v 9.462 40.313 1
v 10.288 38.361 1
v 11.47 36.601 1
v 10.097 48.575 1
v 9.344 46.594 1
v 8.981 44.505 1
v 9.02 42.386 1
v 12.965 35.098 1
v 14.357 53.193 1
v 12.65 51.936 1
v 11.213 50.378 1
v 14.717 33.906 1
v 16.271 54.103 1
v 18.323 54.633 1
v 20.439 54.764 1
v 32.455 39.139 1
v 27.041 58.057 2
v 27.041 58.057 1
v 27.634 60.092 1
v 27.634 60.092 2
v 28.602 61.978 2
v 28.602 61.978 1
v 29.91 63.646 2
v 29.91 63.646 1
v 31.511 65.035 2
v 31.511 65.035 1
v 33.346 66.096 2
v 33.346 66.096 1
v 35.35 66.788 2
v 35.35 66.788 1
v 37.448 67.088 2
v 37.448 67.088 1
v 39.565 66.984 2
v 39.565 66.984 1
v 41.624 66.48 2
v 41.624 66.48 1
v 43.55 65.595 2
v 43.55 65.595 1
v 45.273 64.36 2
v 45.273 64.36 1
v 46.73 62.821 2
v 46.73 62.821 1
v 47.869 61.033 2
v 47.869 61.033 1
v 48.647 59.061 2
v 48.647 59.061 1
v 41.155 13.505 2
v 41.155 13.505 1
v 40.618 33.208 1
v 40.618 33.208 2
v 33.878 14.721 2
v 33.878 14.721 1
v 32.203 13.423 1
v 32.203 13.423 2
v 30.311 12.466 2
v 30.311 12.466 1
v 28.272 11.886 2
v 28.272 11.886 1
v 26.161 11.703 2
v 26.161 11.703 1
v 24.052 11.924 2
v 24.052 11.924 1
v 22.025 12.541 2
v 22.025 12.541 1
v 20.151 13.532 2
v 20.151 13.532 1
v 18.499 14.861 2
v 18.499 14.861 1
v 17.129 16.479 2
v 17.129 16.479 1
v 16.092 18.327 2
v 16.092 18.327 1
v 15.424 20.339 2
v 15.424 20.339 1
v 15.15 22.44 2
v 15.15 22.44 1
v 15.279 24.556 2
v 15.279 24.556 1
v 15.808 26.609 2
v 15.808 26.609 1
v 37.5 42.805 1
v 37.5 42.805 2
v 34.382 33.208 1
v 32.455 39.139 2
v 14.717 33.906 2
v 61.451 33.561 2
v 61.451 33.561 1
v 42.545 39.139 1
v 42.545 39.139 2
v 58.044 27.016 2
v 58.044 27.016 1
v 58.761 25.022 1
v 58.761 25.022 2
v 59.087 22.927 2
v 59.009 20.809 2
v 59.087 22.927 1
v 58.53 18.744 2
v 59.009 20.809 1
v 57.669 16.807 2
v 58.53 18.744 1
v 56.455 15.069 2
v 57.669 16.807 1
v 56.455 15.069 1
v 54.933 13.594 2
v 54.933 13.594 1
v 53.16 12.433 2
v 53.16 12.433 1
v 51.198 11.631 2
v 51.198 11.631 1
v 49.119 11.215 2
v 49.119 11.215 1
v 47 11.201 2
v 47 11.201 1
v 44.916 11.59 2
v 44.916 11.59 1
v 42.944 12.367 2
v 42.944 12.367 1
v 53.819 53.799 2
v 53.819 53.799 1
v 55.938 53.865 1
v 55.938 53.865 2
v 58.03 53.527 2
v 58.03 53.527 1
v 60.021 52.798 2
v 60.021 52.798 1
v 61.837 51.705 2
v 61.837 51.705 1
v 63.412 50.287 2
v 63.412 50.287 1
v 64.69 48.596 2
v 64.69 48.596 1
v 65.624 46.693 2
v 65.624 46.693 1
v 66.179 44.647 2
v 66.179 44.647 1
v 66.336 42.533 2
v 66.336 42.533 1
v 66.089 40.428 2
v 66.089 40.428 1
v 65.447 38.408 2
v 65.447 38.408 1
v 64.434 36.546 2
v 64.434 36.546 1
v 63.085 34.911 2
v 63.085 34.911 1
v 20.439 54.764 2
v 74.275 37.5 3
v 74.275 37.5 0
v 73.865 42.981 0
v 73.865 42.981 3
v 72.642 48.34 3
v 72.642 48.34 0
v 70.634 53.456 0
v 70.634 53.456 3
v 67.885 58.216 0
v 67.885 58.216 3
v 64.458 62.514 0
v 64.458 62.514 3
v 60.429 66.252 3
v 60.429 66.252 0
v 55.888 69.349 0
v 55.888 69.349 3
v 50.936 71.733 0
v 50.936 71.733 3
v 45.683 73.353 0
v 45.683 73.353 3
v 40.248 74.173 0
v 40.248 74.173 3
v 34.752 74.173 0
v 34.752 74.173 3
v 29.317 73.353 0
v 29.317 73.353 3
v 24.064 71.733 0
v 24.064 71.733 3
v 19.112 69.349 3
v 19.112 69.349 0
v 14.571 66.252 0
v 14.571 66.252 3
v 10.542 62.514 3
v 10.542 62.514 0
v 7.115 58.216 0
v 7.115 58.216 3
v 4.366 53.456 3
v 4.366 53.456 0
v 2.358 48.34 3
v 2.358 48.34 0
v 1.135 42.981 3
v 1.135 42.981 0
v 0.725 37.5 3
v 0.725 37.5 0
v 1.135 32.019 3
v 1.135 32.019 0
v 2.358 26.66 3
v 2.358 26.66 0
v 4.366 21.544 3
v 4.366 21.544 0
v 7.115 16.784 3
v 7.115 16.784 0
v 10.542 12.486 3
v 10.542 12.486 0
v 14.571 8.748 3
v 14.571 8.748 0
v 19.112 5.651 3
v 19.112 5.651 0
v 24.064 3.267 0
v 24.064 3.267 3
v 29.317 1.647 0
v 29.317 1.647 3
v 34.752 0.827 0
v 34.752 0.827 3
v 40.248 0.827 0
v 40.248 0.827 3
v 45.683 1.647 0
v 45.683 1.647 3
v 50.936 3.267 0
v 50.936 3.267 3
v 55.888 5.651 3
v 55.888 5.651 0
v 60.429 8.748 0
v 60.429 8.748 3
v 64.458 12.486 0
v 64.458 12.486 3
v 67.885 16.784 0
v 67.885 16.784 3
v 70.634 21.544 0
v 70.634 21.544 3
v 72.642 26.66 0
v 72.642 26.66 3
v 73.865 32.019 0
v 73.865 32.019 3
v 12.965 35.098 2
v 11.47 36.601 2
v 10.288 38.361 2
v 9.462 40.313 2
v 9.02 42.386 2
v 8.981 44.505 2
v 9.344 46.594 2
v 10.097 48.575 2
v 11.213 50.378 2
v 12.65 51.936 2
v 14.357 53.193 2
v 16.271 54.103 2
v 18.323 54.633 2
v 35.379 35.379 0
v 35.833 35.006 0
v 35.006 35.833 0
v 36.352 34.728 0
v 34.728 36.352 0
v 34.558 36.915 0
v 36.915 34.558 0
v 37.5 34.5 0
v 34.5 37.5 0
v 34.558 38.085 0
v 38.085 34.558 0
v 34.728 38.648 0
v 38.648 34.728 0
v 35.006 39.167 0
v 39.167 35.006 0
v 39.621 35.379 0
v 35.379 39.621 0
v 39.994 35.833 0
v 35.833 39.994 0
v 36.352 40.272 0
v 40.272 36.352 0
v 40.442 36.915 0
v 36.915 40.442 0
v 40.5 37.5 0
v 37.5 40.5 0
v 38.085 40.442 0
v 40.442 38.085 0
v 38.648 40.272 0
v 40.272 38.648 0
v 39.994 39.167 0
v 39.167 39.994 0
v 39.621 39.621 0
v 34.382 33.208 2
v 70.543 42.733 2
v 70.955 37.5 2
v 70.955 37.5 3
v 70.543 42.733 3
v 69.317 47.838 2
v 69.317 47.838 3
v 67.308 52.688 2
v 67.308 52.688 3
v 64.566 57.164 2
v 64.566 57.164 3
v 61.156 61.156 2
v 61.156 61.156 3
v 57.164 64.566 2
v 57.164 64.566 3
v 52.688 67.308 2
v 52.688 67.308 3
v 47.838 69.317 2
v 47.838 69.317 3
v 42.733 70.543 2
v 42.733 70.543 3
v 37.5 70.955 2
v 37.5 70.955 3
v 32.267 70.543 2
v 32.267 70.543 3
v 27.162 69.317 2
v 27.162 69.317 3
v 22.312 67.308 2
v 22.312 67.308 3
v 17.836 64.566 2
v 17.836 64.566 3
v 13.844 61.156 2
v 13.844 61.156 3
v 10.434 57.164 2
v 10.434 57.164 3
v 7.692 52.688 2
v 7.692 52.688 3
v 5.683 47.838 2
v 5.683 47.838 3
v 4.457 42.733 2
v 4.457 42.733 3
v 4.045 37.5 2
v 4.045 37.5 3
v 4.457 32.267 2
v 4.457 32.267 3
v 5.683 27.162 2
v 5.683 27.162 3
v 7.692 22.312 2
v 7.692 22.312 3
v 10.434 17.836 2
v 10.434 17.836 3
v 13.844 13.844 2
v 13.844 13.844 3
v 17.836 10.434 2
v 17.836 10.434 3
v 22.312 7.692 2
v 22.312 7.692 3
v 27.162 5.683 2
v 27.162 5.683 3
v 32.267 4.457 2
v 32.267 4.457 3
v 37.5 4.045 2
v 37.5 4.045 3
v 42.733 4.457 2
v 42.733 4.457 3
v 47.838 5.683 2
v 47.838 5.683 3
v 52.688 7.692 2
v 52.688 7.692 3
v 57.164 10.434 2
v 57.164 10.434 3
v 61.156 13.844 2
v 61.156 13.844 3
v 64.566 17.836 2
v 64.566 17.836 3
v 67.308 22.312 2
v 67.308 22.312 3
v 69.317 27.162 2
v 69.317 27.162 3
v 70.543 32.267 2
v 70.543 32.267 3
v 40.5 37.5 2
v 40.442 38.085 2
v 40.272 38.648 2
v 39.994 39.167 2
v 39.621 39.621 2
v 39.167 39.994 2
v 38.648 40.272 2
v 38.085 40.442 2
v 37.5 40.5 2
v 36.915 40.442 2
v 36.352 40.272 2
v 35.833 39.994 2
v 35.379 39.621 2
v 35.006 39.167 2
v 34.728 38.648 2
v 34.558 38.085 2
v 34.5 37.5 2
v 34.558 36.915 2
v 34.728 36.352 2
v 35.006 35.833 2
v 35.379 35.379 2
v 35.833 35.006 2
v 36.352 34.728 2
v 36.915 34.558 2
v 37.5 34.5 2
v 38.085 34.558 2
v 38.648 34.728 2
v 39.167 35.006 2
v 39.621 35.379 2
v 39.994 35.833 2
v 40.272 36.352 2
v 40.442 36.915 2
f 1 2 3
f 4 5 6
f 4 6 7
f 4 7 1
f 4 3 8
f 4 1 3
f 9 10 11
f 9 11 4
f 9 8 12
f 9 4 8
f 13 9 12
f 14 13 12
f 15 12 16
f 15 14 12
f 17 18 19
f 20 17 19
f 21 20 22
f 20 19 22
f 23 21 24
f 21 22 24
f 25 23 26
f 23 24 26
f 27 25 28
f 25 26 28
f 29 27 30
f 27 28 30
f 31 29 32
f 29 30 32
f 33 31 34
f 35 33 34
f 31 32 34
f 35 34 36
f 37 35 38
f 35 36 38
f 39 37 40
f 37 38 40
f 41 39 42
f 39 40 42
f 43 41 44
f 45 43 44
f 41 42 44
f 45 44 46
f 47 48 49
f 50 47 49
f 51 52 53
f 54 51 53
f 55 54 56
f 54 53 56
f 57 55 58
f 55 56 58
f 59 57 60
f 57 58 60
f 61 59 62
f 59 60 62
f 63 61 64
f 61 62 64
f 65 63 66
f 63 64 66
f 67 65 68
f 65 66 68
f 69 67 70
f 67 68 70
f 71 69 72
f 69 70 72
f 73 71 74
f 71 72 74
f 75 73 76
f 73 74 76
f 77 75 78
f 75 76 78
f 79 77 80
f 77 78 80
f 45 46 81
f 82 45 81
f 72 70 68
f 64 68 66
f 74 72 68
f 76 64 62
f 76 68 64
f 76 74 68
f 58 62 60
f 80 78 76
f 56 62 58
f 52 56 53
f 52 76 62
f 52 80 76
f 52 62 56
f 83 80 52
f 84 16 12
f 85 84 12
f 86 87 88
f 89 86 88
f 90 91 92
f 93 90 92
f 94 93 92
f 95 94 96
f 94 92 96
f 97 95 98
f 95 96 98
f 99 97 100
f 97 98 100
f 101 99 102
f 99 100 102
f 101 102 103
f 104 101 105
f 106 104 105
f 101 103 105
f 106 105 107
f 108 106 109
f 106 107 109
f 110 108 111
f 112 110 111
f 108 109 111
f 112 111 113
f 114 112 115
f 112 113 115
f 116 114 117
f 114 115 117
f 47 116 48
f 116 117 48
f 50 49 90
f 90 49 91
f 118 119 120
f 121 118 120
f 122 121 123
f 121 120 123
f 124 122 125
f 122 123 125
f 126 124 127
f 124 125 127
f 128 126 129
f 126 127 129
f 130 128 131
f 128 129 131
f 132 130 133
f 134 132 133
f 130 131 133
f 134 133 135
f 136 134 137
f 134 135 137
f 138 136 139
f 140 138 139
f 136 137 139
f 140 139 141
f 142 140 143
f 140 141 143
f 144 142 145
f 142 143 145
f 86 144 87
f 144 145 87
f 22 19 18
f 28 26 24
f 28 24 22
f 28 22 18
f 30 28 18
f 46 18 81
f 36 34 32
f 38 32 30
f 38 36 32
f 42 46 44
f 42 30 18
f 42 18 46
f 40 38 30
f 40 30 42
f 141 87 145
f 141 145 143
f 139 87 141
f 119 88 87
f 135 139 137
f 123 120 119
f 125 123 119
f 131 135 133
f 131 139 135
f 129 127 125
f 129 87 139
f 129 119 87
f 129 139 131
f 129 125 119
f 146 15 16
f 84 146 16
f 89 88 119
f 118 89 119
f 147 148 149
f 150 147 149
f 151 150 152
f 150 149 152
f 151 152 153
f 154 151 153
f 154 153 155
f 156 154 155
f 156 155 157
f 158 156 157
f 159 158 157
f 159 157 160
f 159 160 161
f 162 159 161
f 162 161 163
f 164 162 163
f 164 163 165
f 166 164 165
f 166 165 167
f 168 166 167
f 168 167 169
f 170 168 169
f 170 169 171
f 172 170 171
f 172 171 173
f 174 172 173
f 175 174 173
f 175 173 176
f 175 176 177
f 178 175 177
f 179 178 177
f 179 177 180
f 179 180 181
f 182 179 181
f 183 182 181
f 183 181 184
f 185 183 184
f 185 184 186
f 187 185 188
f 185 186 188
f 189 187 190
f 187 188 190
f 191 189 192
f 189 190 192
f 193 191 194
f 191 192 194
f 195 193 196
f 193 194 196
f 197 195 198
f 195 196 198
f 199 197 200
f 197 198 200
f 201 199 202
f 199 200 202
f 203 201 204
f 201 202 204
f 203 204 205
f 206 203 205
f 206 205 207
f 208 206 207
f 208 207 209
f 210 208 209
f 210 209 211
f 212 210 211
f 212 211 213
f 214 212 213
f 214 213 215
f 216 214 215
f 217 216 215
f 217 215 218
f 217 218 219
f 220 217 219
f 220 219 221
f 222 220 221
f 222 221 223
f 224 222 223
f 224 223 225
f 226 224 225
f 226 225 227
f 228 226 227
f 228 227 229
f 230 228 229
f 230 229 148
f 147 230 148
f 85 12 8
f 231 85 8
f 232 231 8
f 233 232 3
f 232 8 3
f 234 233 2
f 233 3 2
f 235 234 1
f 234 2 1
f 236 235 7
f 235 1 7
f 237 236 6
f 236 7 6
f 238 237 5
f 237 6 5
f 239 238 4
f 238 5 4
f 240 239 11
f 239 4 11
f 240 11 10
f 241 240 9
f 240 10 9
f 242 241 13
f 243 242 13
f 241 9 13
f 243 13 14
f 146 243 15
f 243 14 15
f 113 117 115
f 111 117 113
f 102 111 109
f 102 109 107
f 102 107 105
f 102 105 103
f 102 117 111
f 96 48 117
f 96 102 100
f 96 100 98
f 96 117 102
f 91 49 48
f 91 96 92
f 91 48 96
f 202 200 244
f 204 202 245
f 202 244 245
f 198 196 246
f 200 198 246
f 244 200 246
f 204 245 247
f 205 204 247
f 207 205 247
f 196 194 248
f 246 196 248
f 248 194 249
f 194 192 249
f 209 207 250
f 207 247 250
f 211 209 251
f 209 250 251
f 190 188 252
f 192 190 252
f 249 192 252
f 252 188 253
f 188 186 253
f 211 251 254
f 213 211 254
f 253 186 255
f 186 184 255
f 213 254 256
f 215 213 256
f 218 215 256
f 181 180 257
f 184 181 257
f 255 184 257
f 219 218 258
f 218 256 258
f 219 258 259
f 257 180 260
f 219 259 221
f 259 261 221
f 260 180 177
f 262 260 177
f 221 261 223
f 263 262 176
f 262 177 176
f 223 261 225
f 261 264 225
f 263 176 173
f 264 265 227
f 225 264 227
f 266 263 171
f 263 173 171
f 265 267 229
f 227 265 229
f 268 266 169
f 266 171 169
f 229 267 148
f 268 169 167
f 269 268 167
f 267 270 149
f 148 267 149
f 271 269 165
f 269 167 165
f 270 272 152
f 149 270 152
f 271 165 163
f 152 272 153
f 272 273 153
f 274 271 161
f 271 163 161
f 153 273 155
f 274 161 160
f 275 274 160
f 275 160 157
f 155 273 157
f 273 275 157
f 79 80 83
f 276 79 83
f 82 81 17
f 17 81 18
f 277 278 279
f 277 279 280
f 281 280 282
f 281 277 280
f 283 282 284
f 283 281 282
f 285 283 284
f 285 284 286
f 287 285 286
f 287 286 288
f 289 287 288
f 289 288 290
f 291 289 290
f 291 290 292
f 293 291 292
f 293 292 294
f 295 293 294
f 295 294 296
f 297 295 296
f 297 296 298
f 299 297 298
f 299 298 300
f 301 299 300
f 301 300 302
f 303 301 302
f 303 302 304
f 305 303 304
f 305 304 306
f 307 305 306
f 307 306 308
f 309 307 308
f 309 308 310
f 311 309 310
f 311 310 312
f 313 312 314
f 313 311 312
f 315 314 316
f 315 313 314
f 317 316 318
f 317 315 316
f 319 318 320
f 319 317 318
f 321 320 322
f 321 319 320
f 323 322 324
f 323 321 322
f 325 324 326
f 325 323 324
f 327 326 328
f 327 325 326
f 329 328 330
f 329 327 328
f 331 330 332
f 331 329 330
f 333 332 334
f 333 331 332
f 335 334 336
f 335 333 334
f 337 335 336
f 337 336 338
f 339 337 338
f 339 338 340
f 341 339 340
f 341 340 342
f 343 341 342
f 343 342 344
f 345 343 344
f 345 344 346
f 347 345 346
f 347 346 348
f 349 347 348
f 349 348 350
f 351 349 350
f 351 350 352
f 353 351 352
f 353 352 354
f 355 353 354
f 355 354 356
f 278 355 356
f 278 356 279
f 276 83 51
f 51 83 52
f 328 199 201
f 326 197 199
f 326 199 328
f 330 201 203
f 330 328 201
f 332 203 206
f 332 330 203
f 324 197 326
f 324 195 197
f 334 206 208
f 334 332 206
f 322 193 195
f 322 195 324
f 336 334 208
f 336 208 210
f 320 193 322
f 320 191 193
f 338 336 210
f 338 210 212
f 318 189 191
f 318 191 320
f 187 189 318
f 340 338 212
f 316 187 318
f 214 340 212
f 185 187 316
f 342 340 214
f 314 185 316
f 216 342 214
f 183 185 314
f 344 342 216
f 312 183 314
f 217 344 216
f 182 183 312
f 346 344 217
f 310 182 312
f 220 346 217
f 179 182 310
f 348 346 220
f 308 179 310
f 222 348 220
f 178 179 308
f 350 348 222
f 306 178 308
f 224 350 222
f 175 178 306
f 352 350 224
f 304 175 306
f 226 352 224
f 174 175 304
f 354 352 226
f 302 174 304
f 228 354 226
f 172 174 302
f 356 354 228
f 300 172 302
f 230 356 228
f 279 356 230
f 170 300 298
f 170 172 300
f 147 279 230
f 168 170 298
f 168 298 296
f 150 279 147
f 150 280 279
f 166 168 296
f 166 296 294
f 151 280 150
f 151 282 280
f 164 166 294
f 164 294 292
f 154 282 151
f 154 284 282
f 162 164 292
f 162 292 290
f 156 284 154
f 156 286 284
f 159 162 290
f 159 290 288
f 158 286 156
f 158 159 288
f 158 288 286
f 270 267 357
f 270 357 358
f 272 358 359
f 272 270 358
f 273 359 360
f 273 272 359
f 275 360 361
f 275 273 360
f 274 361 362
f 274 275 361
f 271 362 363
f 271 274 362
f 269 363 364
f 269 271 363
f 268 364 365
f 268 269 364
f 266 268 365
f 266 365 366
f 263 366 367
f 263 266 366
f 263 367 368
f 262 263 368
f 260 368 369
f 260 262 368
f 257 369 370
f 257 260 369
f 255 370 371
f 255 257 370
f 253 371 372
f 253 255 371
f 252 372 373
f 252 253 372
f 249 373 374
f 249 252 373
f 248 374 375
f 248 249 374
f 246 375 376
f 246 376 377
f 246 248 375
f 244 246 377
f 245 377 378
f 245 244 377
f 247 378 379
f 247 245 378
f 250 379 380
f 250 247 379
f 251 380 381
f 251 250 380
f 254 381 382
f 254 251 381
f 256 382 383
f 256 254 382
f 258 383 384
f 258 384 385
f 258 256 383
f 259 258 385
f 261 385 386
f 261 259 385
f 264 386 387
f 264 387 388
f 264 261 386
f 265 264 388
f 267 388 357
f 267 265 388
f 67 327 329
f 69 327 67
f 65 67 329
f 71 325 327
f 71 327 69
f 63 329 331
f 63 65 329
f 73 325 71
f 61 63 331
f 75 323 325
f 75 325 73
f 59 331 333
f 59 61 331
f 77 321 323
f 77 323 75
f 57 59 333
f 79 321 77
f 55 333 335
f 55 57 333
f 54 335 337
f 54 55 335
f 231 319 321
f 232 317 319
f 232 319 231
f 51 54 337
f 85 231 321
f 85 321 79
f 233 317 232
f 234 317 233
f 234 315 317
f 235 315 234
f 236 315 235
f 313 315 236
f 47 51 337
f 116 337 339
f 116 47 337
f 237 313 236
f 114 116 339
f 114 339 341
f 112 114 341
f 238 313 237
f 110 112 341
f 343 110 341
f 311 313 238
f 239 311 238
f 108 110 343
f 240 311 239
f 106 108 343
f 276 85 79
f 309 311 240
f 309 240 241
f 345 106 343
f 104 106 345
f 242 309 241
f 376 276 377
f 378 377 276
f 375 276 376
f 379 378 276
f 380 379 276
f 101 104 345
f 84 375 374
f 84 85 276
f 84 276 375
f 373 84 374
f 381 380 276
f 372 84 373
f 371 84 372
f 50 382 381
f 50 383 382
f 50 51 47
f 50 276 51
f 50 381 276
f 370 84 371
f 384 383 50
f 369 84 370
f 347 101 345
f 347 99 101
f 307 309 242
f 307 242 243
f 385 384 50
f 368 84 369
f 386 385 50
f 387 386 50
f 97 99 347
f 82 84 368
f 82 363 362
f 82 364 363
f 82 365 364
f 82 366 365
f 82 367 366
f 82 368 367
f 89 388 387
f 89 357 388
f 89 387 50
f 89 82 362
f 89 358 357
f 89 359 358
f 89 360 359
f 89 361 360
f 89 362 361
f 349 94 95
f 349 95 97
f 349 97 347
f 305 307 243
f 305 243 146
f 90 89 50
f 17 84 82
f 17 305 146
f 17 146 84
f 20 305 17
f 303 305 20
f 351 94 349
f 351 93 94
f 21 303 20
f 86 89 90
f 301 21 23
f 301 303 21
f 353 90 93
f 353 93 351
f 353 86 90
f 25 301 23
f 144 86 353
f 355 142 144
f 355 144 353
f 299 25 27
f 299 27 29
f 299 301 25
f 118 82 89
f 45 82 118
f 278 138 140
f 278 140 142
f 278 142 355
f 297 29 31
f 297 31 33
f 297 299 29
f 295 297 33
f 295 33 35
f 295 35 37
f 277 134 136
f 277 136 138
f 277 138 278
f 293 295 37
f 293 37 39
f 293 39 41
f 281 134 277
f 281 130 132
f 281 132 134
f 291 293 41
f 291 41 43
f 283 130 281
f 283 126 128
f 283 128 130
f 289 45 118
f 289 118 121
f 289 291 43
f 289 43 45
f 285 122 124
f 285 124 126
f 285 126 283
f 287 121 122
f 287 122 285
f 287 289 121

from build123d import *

# Parameters (mm, degrees)
F0_R     = 36.775491
F0_R_2   = 33.454841
F0_R_3   = 3
F1_DEPTH = 2
F2_DEPTH = 3
F3_DEPTH = 1


with BuildPart() as f1:
    # F0 (on Top) → F1 (new body)
    with BuildSketch(Plane.XY):
        with Locations((37.5, 37.5)):
            Circle(F0_R)
        with Locations((37.5, 37.5)):
            Circle(F0_R_2, mode=Mode.SUBTRACT)
        with Locations((37.5, 37.5)):
            Circle(F0_R_2)
        with BuildLine():
            ThreePointArc((33.878023, 14.721462), (20.150811, 13.532255), (15.808449, 26.60874))
            Line((15.808449, 26.60874), (34.38191, 33.208317))
            Line((34.38191, 33.208317), (33.878023, 14.721462))
        make_face(mode=Mode.SUBTRACT)
        with BuildLine():
            Line((41.155146, 13.504525), (40.61809, 33.208317))
            Line((40.61809, 33.208317), (58.044424, 27.01634))
            ThreePointArc((58.044424, 27.01634), (54.933486, 13.593501), (41.155146, 13.504525))
        make_face(mode=Mode.SUBTRACT)
        with BuildLine():
            ThreePointArc((14.717071, 33.905749), (9.344126, 46.593618), (20.438738, 54.764306))
            Line((20.438738, 54.764306), (32.454824, 39.139277))
            Line((32.454824, 39.139277), (14.717071, 33.905749))
        make_face(mode=Mode.SUBTRACT)
        with Locations((37.5, 37.5)):
            Circle(F0_R_3, mode=Mode.SUBTRACT)
        with BuildLine():
            Line((61.450556, 33.561241), (42.545176, 39.139277))
            Line((42.545176, 39.139277), (53.819129, 53.79928))
            ThreePointArc((53.819129, 53.79928), (65.623675, 46.692716), (61.450556, 33.561241))
        make_face(mode=Mode.SUBTRACT)
        with BuildLine():
            Line((37.5, 42.804812), (27.041352, 58.057169))
            ThreePointArc((27.041352, 58.057169), (37.447901, 67.08791), (48.647111, 59.061188))
            Line((48.647111, 59.061188), (37.5, 42.804812))
        make_face(mode=Mode.SUBTRACT)
    extrude(amount=F1_DEPTH)

    # F0 (on Top) → F2 (join)
    with BuildSketch(Plane.XY):
        with Locations((37.5, 37.5)):
            Circle(F0_R)
        with Locations((37.5, 37.5)):
            Circle(F0_R_2, mode=Mode.SUBTRACT)
    extrude(amount=F2_DEPTH)

    # F0 (on Top) → F3 (join)
    with BuildSketch(Plane.XY):
        with BuildLine():
            Line((32.454824, 39.139277), (20.438738, 54.764306))
            ThreePointArc((20.438738, 54.764306), (9.344126, 46.593618), (14.717071, 33.905749))
            Line((14.717071, 33.905749), (32.454824, 39.139277))
        make_face()
        with BuildLine():
            ThreePointArc((48.647111, 59.061188), (37.447901, 67.08791), (27.041352, 58.057169))
            Line((27.041352, 58.057169), (37.5, 42.804812))
            Line((37.5, 42.804812), (48.647111, 59.061188))
        make_face()
        with BuildLine():
            Line((53.819129, 53.79928), (42.545176, 39.139277))
            Line((42.545176, 39.139277), (61.450556, 33.561241))
            ThreePointArc((61.450556, 33.561241), (65.623675, 46.692716), (53.819129, 53.79928))
        make_face()
        with BuildLine():
            Line((58.044424, 27.01634), (40.61809, 33.208317))
            Line((40.61809, 33.208317), (41.155146, 13.504525))
            ThreePointArc((41.155146, 13.504525), (54.933486, 13.593501), (58.044424, 27.01634))
        make_face()
        with BuildLine():
            Line((34.38191, 33.208317), (15.808449, 26.60874))
            ThreePointArc((15.808449, 26.60874), (20.150811, 13.532255), (33.878023, 14.721462))
            Line((33.878023, 14.721462), (34.38191, 33.208317))
        make_face()
    extrude(amount=F3_DEPTH)


solid = f1.part
